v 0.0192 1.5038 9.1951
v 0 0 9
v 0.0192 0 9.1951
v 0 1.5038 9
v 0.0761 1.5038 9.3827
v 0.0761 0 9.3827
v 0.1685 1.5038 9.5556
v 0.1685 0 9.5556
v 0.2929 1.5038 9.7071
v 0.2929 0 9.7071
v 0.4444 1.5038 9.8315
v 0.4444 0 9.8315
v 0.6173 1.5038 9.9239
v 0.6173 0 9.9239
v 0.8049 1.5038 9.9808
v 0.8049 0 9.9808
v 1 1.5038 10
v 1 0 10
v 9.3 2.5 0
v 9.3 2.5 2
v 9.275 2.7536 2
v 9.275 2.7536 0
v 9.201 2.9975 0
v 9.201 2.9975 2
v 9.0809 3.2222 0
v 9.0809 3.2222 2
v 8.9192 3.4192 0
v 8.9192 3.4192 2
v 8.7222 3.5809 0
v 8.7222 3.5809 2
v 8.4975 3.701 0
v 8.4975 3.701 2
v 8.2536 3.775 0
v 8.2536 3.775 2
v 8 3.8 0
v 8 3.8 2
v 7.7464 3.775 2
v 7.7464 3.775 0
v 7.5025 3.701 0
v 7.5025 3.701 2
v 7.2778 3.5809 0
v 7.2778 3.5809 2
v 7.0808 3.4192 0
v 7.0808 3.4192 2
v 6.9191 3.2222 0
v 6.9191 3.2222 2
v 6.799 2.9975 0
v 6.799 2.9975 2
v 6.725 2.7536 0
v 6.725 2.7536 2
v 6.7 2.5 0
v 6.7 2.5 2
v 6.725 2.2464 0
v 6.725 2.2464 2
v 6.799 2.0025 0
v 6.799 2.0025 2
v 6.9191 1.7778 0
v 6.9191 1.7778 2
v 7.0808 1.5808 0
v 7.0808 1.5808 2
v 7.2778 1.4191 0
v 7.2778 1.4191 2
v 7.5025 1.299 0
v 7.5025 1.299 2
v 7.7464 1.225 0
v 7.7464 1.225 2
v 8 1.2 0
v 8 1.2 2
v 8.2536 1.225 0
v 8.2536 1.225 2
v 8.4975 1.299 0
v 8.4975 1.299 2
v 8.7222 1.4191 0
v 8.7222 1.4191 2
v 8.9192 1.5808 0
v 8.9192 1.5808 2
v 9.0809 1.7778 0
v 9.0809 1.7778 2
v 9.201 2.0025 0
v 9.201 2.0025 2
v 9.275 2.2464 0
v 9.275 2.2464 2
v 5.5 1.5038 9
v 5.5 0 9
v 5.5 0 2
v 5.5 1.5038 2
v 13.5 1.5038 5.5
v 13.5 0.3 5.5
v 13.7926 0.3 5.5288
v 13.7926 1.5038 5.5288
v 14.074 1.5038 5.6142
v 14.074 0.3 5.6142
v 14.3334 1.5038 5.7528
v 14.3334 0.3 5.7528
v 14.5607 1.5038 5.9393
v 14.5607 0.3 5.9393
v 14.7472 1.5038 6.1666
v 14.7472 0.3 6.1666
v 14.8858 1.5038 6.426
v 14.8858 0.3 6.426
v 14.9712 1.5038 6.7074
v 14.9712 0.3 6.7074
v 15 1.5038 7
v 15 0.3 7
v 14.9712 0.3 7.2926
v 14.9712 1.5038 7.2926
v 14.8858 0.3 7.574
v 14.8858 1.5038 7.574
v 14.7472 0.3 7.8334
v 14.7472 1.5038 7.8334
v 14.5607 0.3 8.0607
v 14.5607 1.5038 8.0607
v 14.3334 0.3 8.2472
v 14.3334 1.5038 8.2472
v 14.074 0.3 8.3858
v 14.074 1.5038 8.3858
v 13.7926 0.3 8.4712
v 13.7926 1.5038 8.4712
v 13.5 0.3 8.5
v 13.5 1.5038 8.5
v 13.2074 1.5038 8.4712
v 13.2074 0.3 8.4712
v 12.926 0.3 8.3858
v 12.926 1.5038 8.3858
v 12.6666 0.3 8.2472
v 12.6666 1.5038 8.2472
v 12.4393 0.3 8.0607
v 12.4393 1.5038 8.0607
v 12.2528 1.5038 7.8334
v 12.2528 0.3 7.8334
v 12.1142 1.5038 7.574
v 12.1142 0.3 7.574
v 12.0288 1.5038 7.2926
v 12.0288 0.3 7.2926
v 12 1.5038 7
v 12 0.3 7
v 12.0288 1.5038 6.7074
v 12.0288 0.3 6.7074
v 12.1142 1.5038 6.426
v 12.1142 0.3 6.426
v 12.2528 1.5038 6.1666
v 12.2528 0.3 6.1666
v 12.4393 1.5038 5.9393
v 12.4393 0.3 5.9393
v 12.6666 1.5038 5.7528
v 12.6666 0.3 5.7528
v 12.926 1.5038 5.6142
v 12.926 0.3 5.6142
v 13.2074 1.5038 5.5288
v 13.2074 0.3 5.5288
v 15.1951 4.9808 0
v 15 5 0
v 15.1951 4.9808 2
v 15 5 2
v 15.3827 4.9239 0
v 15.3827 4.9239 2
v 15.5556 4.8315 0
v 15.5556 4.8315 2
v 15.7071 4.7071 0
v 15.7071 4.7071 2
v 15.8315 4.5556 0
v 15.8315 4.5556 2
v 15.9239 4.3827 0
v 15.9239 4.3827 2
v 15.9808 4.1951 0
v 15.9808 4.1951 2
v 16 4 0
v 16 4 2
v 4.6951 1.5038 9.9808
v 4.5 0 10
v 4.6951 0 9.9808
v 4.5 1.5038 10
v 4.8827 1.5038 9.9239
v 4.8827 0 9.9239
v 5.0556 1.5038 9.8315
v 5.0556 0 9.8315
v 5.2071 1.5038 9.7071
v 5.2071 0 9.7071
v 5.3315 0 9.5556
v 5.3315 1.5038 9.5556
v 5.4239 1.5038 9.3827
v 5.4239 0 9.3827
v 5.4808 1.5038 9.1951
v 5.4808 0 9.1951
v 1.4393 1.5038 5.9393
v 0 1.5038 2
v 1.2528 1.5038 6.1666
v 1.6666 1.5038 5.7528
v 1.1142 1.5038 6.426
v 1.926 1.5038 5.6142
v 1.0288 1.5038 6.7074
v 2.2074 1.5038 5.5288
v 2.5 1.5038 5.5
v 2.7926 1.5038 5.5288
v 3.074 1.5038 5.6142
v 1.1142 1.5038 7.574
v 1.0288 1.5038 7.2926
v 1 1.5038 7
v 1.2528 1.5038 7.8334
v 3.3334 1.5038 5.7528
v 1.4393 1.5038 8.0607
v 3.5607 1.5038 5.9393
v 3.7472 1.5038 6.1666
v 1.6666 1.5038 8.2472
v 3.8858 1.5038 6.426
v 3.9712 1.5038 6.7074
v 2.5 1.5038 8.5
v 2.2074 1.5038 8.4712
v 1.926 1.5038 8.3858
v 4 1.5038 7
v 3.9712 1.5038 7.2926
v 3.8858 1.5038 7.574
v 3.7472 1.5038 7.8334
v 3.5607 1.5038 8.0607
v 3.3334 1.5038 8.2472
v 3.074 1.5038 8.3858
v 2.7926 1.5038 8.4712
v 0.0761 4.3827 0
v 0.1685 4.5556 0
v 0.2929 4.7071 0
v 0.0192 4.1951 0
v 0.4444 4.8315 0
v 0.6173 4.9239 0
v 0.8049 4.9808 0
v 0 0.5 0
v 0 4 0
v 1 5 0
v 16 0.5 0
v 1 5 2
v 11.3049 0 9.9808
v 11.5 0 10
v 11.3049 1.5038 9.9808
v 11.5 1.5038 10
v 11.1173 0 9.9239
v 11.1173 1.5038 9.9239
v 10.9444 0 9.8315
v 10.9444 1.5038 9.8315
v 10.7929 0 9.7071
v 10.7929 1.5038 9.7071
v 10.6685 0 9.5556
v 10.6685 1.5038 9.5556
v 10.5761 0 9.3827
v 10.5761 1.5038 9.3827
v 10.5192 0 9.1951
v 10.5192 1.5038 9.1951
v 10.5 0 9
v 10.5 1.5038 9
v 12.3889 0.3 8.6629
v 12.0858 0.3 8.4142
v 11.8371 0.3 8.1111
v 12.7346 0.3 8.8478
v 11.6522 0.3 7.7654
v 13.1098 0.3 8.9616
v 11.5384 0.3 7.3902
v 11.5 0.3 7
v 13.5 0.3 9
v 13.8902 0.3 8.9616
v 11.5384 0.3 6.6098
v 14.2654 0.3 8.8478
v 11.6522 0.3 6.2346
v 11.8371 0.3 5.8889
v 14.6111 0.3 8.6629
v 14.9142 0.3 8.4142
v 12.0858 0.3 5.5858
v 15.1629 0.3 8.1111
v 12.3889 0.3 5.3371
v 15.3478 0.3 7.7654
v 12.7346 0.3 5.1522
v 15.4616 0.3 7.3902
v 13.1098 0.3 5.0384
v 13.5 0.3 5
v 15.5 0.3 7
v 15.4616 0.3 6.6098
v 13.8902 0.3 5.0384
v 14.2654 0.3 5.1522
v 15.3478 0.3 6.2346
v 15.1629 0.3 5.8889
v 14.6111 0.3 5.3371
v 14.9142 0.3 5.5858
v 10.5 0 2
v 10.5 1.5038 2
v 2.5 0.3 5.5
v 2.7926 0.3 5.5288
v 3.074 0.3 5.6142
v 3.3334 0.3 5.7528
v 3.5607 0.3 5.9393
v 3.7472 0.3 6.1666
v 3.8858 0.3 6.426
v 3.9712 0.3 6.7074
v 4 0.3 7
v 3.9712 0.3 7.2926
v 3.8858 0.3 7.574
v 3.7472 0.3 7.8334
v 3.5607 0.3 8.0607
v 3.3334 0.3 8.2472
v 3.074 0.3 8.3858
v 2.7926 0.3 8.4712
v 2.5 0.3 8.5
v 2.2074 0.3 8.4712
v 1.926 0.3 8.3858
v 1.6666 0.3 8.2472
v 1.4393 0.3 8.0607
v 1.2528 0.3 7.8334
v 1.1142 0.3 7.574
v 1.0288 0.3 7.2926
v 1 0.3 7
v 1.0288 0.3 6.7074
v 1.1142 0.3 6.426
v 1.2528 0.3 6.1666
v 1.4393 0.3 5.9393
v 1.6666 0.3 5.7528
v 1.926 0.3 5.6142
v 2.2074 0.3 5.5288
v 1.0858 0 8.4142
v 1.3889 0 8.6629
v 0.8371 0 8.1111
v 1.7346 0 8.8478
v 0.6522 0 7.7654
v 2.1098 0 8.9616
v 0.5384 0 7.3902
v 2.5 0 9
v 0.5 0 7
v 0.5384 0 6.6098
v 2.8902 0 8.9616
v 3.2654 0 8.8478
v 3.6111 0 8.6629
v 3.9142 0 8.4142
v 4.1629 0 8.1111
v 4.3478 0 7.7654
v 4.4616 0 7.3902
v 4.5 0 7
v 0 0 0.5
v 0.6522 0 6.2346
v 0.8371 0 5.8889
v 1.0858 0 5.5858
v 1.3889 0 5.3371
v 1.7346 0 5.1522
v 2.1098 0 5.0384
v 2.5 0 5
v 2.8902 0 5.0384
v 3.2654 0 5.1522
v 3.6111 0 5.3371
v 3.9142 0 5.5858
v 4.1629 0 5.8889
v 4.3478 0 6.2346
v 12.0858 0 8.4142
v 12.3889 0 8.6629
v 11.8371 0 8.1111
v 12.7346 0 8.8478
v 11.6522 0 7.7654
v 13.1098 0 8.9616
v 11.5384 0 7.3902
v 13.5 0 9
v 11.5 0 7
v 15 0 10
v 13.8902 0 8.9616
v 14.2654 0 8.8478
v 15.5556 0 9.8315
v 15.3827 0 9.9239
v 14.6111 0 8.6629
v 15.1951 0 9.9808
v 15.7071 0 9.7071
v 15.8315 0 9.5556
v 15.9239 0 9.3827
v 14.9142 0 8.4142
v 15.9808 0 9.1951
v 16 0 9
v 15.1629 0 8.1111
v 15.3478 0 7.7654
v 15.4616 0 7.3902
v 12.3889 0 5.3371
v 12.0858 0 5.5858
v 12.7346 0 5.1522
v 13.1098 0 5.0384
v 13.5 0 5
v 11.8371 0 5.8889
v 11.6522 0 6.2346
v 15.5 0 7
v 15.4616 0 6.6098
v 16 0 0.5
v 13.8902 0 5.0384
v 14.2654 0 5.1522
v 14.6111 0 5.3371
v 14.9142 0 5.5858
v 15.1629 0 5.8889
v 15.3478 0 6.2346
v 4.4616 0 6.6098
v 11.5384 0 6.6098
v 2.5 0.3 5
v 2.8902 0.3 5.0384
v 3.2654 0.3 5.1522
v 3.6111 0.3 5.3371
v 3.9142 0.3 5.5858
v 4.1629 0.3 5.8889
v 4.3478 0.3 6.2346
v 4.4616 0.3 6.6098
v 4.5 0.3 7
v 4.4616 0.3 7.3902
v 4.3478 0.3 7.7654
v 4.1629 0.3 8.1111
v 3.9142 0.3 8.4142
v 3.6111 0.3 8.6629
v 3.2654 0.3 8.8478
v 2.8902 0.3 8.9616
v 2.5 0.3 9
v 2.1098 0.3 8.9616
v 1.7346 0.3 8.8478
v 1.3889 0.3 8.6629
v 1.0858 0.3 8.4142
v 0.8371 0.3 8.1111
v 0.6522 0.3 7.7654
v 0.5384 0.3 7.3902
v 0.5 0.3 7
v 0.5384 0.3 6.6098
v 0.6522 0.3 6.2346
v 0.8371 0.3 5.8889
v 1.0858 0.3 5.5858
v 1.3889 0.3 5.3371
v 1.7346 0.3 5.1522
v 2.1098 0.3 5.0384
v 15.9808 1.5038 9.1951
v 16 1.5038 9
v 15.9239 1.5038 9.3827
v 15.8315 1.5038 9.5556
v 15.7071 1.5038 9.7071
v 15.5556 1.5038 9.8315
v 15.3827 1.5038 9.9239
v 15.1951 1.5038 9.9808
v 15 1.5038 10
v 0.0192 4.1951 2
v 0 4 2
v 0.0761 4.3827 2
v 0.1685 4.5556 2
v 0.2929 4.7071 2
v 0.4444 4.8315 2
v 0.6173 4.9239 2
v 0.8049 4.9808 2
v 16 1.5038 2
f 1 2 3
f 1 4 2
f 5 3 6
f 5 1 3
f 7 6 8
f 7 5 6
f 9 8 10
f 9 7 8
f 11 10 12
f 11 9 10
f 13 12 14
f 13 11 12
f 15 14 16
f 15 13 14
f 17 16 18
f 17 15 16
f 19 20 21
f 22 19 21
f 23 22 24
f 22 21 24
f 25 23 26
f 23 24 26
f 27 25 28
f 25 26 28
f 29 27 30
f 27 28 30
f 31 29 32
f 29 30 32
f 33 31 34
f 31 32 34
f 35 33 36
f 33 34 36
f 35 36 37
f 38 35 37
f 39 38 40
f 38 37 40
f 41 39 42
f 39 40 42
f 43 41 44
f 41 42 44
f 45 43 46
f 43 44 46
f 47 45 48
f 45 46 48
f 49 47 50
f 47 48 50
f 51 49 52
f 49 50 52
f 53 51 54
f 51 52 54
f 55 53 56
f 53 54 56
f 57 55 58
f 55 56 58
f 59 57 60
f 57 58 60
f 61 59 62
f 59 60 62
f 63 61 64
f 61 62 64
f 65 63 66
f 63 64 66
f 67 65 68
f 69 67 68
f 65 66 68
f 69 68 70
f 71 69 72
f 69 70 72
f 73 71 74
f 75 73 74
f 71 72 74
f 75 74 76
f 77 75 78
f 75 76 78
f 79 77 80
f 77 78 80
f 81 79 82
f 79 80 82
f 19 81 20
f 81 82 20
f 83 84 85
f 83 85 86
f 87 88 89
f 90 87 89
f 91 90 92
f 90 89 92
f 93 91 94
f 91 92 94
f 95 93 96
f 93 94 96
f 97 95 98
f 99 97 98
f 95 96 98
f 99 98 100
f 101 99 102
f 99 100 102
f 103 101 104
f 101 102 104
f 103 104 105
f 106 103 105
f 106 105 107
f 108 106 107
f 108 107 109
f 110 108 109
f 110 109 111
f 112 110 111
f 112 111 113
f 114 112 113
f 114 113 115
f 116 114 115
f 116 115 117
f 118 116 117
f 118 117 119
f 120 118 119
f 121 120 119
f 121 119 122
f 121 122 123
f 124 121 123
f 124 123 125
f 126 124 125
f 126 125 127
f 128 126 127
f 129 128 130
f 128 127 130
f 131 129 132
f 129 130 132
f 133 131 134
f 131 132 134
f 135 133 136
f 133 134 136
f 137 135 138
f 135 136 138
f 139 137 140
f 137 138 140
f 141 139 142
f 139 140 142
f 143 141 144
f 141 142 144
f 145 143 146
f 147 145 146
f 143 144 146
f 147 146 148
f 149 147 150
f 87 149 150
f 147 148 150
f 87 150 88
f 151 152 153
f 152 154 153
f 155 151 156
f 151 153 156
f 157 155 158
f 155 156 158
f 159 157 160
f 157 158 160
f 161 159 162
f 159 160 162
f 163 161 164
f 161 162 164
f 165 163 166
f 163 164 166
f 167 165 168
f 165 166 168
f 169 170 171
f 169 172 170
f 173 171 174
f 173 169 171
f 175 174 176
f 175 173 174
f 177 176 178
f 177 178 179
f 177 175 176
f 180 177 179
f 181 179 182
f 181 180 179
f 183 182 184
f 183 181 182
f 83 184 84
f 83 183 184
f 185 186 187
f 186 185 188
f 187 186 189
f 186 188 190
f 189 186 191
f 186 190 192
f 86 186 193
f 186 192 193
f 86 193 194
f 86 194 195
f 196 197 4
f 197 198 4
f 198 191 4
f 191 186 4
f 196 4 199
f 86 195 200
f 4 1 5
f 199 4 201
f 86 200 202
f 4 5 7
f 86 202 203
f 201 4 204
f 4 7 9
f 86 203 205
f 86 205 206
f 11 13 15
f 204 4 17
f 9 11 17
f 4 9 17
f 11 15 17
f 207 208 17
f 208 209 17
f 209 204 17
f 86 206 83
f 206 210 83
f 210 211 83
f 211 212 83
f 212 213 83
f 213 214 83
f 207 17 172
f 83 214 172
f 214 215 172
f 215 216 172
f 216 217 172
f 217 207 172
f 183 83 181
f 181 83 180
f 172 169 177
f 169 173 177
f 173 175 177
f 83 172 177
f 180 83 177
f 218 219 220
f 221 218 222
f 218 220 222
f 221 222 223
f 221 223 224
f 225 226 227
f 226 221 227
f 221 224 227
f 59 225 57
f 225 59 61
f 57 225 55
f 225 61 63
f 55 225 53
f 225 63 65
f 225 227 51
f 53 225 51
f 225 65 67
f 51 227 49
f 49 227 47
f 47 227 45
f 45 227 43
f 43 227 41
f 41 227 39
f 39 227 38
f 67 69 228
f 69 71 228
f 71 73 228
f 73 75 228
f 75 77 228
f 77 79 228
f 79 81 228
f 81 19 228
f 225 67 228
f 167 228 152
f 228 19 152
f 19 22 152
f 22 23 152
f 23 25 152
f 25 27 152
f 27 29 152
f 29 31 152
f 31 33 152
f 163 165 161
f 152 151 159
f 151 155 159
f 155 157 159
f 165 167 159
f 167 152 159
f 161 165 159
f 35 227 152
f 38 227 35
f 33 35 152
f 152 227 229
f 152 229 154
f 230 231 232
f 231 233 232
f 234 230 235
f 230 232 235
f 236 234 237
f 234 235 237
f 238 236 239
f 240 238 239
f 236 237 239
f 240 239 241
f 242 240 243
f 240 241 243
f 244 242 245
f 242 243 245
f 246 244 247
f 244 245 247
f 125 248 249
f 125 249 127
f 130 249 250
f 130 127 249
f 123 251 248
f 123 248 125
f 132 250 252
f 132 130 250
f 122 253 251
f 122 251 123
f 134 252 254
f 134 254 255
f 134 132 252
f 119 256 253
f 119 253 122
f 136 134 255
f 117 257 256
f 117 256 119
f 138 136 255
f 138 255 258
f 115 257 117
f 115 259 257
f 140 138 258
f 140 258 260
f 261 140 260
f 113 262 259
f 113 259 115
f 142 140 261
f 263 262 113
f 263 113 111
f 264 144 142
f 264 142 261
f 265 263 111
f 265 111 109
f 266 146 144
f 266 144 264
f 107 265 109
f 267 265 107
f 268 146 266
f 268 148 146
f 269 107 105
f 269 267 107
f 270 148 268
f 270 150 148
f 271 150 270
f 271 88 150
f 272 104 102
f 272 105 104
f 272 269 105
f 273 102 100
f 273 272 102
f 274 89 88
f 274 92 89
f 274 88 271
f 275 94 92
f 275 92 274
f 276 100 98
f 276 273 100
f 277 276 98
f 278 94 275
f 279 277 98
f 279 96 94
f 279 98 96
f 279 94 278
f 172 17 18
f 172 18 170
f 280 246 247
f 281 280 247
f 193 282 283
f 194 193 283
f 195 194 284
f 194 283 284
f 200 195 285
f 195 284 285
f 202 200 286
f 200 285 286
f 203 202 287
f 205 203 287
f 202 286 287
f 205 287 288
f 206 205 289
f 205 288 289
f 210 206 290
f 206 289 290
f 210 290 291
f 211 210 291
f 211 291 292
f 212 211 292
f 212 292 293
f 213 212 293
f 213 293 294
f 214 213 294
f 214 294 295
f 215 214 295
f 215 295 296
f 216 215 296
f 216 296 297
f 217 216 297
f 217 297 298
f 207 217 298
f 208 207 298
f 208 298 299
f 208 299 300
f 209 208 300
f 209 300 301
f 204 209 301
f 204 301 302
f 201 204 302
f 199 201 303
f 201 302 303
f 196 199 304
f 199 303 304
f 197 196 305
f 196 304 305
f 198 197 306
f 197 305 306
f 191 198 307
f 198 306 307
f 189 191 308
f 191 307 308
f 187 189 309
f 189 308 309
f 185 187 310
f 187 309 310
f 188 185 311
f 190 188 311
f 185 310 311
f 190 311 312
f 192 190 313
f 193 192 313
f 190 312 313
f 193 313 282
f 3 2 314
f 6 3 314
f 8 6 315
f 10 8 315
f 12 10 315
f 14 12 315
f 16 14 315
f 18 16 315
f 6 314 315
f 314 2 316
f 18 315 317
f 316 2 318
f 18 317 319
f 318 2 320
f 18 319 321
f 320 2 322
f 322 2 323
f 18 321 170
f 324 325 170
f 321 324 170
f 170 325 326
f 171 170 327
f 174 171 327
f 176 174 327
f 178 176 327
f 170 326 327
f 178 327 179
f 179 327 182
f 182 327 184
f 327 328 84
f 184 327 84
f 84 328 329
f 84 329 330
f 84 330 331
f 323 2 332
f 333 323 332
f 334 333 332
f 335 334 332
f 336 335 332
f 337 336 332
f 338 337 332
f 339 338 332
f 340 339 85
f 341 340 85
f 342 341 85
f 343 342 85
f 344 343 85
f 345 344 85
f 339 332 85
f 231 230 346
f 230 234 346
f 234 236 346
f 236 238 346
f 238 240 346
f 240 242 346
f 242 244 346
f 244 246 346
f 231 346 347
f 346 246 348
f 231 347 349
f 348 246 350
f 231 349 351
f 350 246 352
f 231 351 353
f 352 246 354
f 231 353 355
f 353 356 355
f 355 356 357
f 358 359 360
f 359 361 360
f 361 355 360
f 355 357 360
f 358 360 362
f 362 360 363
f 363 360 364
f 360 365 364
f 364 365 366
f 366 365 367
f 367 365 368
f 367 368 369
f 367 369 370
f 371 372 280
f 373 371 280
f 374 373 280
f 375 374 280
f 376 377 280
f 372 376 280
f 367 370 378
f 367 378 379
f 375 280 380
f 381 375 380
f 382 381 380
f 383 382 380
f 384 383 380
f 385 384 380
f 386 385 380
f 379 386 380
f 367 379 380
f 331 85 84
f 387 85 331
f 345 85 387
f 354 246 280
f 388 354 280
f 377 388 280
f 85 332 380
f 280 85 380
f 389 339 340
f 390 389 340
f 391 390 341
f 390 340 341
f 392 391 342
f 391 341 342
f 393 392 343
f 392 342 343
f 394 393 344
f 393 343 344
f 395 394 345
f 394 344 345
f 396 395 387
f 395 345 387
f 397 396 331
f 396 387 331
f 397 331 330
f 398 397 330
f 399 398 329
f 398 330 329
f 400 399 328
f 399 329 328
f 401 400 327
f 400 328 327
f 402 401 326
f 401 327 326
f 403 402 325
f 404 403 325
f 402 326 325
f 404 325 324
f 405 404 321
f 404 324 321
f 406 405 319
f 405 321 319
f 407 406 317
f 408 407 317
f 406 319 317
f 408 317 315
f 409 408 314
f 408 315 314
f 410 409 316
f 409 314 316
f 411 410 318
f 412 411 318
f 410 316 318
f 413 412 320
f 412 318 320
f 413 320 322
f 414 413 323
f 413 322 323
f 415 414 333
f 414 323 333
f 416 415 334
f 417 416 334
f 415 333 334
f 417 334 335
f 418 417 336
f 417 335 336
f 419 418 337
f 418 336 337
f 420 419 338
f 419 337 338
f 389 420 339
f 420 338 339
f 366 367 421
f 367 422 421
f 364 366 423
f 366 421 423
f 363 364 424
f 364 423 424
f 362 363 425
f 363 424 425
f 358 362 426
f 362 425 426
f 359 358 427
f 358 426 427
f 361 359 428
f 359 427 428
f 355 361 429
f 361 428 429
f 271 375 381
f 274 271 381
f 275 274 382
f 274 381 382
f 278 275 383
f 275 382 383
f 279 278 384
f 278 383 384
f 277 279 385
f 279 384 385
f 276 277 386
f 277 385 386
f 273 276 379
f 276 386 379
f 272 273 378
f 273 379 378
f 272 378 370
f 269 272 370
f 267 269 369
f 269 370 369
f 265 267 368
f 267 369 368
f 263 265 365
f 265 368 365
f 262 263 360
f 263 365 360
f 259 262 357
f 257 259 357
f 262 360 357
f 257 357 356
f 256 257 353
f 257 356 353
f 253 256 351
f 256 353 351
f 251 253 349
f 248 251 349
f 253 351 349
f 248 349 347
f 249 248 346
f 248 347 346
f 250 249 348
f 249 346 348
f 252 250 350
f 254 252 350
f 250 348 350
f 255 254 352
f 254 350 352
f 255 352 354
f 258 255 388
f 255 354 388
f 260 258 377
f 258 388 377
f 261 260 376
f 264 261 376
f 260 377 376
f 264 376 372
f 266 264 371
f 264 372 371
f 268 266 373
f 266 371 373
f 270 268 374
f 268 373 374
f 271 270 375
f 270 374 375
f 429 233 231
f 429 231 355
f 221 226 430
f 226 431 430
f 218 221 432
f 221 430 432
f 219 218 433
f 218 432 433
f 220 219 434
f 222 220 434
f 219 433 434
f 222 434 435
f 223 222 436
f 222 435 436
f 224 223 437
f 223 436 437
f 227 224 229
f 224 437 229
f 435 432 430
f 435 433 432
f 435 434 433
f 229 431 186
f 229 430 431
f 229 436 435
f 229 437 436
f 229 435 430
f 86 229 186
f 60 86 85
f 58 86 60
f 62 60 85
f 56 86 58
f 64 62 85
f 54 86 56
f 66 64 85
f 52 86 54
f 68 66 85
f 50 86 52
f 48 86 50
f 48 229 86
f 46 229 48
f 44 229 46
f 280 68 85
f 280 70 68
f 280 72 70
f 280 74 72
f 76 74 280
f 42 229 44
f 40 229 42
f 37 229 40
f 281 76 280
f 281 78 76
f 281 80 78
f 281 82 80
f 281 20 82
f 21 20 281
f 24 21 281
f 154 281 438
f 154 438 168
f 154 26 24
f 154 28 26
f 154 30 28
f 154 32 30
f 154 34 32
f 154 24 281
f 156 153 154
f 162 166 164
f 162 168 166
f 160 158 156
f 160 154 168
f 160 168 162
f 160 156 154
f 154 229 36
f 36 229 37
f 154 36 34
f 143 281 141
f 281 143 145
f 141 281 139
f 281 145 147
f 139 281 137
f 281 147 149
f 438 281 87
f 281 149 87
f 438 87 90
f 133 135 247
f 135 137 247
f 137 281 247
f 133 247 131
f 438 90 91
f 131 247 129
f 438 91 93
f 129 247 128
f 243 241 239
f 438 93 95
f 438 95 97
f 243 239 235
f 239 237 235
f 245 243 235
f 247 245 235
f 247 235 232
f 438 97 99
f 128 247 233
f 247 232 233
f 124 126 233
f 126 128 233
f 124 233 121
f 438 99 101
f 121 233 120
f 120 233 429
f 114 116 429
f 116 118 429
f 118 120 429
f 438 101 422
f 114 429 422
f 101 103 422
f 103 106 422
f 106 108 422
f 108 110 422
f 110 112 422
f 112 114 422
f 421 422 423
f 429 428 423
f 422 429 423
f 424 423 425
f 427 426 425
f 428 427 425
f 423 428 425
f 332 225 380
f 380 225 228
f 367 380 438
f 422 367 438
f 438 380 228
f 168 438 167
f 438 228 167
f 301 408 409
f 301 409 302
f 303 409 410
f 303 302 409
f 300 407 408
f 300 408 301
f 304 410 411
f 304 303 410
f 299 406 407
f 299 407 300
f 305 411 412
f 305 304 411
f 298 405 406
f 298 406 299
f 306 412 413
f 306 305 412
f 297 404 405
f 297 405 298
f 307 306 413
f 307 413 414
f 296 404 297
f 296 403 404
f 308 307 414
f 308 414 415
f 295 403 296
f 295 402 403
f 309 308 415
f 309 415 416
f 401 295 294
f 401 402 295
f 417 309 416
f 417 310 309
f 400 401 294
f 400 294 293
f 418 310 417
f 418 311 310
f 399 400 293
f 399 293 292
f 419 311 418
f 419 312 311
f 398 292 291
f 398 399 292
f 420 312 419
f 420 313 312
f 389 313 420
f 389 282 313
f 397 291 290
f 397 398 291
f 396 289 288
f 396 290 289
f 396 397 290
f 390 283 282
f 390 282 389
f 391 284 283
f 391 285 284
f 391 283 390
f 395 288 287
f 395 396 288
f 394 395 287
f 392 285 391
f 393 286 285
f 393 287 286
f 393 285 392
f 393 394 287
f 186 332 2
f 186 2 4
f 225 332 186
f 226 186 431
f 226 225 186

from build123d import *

# Parameters (mm, degrees)
SKETCH_1_W          = 16
SKETCH_1_H          = 5
EXTRUDE_1_DEPTH     = 10
SKETCH_2_W          = 16
SKETCH_2_H          = 3.496194888
CUT_EXTRUDE_1_DEPTH = 8
SKETCH_4_W          = 5
SKETCH_4_H          = 1.503805112
CUT_EXTRUDE_3_DEPTH = 8
SKETCH_3_R          = 1.3
CUT_EXTRUDE_2_DEPTH = 2
SKETCH_5_R          = 1.5
CUT_EXTRUDE_5_DEPTH = 2
SKETCH_6_R          = 2
CUT_EXTRUDE_6_DEPTH = 0.3
FILLET_1_R          = 1
FILLET_2_R          = 1
CHAMFER_1_SIZE      = 0.5


with BuildPart() as part:
    # 草图1 → 凸台-拉伸1 (new body)
    with BuildSketch(Plane.XY):
        with Locations((8, 2.5)):
            Rectangle(SKETCH_1_W, SKETCH_1_H)
    extrude(amount=EXTRUDE_1_DEPTH)

    # 草图2 → 切除-拉伸1 (cut)
    with BuildSketch(Plane.XY.offset(10)):
        with Locations((8, 3.251902556)):
            Rectangle(SKETCH_2_W, SKETCH_2_H)
    extrude(amount=-CUT_EXTRUDE_1_DEPTH, mode=Mode.SUBTRACT)

    # 草图4 → 切除-拉伸3 (cut)
    with BuildSketch(Plane.XY.offset(10)):
        with Locations((8, 0.751902556)):
            Rectangle(SKETCH_4_W, SKETCH_4_H)
    extrude(amount=-CUT_EXTRUDE_3_DEPTH, mode=Mode.SUBTRACT)

    # 草图3 → 切除-拉伸2 (cut)
    with BuildSketch(Plane.XY.offset(2)):
        with Locations((8, 2.5)):
            Circle(SKETCH_3_R)
    extrude(amount=-CUT_EXTRUDE_2_DEPTH, mode=Mode.SUBTRACT)

    # 草图5 → 切除-拉伸5 (cut)
    with BuildSketch(Plane.XZ):
        with Locations(Location((2.5, 7, 0), (0, 0, 270))):
            Circle(SKETCH_5_R)
        with Locations(Location((13.5, 7, 0), (0, 0, 270))):
            Circle(SKETCH_5_R)
    extrude(amount=-CUT_EXTRUDE_5_DEPTH, mode=Mode.SUBTRACT)

    # 草图6 → 切除-拉伸6 (cut)
    with BuildSketch(Plane.XZ):
        with Locations(Location((2.5, 7, 0), (0, 0, 270))):
            Circle(SKETCH_6_R)
        with Locations(Location((13.5, 7, 0), (0, 0, 270))):
            Circle(SKETCH_6_R)
    extrude(amount=-CUT_EXTRUDE_6_DEPTH, mode=Mode.SUBTRACT)

    # 圆角1
    fillet_1_edges = [part.edges().sort_by_distance(p)[0] for p in [
        (0, 5, 1),
        (16, 5, 1),
    ]]
    fillet(fillet_1_edges, radius=FILLET_1_R)

    # 圆角2
    fillet_2_edges = [part.edges().sort_by_distance(p)[0] for p in [
        (16, 0.751902556, 10),
        (0, 0.751902556, 10),
        (5.5, 0.751902556, 10),
        (10.5, 0.751902556, 10),
    ]]
    fillet(fillet_2_edges, radius=FILLET_2_R)

    # 倒角1
    chamfer_1_edges = [part.edges().sort_by_distance(p)[0] for p in [
        (8, 0, 0),
    ]]
    chamfer(chamfer_1_edges, length=CHAMFER_1_SIZE)


solid = part.part
